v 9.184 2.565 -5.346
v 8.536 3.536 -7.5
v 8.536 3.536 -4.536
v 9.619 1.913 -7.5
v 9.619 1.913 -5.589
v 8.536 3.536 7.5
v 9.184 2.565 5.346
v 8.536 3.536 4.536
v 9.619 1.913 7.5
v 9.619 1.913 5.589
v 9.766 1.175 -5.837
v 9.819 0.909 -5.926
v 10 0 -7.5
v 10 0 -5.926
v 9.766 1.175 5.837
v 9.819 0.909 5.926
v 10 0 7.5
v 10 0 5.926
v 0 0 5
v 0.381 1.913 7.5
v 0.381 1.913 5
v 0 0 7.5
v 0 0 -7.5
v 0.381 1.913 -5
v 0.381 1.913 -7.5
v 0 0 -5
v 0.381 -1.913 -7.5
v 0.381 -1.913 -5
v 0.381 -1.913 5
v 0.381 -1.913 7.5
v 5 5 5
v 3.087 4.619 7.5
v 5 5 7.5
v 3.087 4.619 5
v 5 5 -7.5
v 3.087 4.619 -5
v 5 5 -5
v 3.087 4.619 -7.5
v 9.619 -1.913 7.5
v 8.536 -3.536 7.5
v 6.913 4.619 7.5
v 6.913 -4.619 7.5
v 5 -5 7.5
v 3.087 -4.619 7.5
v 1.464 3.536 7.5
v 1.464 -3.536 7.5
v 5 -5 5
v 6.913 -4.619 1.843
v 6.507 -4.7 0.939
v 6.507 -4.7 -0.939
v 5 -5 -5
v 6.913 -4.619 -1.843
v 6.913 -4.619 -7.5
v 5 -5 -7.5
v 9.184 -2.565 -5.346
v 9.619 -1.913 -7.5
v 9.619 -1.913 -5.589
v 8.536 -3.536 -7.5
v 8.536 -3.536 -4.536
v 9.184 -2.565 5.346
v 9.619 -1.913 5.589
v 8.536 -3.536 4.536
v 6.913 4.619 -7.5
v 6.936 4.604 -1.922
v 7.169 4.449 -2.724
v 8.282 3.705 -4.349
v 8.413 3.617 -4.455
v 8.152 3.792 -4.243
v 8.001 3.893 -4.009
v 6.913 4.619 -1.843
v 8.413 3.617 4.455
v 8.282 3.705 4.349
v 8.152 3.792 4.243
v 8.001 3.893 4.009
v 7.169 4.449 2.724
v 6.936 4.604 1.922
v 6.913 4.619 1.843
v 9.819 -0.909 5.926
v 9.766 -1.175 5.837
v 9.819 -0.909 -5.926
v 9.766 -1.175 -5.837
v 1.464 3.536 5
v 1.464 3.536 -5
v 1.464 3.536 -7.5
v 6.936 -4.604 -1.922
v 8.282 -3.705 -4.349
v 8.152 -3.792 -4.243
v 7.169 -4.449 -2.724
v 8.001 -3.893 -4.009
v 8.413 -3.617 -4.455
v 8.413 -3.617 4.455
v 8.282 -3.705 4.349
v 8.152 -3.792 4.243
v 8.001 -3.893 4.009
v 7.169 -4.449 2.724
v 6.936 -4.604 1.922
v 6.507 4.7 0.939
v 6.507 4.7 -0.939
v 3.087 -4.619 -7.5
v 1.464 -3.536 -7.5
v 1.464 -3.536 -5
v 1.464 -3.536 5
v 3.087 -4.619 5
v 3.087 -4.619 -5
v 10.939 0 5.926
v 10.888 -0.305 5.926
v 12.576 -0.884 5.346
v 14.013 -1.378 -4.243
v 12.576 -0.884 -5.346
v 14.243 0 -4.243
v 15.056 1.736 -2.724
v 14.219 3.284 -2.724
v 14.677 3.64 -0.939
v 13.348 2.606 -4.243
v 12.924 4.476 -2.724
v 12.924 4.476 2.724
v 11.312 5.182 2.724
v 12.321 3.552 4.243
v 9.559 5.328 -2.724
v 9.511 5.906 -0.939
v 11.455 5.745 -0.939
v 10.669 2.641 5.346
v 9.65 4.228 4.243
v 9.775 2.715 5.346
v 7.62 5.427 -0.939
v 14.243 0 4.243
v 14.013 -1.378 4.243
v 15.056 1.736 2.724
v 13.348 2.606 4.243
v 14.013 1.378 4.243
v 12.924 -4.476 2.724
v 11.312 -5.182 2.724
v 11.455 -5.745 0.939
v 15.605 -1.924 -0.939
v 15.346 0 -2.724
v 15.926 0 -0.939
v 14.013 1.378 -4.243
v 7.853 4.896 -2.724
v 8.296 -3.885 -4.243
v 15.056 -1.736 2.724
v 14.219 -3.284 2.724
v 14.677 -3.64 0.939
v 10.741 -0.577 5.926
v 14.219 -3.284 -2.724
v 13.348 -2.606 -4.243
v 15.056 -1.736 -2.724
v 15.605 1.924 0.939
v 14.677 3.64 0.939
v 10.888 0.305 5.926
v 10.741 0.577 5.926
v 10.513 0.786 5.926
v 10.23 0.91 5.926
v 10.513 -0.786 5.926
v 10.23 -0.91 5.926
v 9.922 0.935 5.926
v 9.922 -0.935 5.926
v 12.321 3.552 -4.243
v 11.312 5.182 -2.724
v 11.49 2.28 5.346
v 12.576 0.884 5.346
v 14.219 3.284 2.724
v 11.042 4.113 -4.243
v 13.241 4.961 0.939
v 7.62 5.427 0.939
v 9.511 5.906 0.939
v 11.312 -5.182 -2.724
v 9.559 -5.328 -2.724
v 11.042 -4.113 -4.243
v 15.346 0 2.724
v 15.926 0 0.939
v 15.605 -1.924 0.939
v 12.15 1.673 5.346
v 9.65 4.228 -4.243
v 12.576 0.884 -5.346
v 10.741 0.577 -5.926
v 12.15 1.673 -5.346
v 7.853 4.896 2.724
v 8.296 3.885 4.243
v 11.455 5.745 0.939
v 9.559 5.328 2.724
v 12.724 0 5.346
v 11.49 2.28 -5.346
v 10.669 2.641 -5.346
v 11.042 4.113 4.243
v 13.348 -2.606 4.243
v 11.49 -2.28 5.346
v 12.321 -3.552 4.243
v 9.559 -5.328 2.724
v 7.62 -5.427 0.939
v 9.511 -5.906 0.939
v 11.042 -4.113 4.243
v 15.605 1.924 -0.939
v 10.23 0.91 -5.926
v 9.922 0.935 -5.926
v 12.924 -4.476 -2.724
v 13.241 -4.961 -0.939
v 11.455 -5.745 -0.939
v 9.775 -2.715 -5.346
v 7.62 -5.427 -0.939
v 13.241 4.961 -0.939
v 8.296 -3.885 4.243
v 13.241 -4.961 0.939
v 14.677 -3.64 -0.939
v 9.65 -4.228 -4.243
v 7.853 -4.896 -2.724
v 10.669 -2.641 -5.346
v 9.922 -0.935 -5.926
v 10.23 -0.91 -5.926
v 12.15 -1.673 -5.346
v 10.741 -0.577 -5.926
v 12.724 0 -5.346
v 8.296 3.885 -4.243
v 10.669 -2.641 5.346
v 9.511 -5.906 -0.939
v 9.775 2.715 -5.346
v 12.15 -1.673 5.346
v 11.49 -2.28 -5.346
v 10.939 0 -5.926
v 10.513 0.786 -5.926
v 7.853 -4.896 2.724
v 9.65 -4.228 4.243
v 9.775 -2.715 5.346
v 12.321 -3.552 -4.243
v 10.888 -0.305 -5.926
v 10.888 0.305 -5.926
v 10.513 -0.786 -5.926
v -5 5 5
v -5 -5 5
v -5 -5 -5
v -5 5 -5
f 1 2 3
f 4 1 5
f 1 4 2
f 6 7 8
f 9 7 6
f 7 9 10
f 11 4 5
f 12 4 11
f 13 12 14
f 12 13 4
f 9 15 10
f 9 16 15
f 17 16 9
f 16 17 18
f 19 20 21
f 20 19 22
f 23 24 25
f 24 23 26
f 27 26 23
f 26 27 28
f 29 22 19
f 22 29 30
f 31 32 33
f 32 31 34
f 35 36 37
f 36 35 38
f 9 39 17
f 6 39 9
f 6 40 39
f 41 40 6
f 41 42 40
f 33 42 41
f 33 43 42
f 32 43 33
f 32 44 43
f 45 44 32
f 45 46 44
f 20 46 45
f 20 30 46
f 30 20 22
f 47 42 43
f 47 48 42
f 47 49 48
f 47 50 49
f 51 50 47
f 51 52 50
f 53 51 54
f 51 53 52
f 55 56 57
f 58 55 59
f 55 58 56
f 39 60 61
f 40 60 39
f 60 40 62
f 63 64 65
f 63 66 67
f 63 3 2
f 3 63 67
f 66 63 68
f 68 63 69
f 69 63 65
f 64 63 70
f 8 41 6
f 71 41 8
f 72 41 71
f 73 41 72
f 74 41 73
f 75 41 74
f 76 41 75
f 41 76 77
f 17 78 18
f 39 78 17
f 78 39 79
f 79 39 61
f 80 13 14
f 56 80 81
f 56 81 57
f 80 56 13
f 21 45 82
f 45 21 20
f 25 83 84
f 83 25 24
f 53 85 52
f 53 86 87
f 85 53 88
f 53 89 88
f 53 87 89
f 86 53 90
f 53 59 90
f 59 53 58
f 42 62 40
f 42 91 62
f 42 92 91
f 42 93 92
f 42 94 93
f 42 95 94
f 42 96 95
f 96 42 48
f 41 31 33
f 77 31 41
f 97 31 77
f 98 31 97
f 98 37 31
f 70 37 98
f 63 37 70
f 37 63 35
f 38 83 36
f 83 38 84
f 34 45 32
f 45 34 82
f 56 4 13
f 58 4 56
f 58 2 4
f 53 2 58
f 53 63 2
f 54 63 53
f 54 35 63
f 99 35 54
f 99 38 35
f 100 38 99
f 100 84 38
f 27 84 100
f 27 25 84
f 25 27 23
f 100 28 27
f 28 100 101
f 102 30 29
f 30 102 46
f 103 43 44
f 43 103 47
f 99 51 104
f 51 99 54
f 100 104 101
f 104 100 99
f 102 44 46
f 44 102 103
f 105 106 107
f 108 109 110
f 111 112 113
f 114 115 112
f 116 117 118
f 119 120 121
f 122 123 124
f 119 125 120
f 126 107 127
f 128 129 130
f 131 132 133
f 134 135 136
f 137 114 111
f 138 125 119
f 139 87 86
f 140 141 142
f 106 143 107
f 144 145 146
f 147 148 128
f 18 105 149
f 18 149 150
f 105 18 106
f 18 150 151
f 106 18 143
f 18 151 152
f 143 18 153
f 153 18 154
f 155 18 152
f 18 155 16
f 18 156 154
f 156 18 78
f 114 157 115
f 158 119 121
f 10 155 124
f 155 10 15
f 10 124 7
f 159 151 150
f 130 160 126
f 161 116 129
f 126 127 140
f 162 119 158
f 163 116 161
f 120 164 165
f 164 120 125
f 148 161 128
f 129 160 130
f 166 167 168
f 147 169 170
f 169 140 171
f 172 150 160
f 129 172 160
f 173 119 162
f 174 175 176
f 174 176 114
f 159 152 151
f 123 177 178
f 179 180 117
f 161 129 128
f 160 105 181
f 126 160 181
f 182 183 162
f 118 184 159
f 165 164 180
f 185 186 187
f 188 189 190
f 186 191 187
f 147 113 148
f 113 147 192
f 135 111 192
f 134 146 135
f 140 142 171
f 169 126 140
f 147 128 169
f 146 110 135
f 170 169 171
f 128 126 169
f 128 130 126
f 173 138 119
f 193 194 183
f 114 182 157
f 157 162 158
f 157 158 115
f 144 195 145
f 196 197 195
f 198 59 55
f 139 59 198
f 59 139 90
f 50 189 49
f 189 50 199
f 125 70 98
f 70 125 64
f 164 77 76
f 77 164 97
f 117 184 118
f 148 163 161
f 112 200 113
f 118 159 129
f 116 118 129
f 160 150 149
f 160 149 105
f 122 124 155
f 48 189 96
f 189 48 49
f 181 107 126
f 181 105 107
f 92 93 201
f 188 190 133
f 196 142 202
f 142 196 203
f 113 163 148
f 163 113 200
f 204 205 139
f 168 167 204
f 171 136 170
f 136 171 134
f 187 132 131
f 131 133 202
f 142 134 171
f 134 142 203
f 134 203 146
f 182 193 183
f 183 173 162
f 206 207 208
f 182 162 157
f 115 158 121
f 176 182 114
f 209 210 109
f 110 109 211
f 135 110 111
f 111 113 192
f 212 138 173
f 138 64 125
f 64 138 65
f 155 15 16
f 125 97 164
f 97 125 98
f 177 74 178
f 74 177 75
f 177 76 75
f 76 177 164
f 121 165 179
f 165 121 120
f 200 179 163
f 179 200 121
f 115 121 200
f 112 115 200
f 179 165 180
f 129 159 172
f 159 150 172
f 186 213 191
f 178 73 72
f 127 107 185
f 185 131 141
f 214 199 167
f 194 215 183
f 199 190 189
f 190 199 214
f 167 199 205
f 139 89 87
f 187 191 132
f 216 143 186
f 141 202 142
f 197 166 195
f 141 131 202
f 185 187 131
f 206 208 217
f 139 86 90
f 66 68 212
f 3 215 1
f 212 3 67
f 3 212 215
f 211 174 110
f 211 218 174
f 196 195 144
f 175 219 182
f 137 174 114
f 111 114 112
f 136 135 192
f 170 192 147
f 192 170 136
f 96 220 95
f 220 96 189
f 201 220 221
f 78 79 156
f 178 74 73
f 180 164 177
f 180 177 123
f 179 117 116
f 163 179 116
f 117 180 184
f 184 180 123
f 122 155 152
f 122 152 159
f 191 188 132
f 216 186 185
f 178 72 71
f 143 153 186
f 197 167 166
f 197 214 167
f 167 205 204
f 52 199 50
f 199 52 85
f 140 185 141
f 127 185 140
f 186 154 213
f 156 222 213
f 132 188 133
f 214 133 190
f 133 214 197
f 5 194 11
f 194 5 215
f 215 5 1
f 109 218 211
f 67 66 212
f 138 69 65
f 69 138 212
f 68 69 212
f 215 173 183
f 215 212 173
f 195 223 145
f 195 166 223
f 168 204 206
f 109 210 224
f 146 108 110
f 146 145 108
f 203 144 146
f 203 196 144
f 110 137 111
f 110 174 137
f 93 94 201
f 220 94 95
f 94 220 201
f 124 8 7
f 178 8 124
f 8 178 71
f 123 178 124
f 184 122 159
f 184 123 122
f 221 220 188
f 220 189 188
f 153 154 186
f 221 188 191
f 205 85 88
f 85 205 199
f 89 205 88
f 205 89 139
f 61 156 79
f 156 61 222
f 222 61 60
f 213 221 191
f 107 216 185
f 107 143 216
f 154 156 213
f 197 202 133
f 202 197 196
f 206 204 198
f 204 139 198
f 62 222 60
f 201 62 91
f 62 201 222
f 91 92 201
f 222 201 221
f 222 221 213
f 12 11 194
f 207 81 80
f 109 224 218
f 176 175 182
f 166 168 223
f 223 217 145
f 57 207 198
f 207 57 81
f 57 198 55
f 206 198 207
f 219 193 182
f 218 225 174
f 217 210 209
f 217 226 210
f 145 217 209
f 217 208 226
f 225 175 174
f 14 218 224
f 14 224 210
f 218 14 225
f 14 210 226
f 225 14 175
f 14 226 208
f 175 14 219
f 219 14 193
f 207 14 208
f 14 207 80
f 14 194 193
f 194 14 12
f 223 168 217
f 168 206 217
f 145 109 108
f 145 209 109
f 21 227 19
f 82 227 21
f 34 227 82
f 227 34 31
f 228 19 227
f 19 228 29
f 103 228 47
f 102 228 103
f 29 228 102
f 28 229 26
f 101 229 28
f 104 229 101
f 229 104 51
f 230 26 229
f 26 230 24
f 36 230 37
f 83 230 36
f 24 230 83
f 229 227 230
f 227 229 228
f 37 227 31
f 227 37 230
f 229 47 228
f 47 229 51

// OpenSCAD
// Size of the Cube (all directions)
cuSize = 10;

// The diameter of the Cylinder
cyDia = 10;

// The height of the Cylinder
cyHei = 15;

// The radius of the Sphere
sphereRadius = 6;

// X-Translation of the Cylinder and Sphere
tX = 5;

// Create Cube and move Cylinder and Sphere by 'tX'
// Then move Sphere again by 'tX'
// The inner translation does not need {} around
// if you only translate one shape
cube(size = [cuSize, cuSize, cuSize], center = true);
translate([tX, 0, 0]){
    cylinder(d = cyDia, h = cyHei, center = true);
    translate([tX, 0, 0])
        sphere(r = sphereRadius);
}
